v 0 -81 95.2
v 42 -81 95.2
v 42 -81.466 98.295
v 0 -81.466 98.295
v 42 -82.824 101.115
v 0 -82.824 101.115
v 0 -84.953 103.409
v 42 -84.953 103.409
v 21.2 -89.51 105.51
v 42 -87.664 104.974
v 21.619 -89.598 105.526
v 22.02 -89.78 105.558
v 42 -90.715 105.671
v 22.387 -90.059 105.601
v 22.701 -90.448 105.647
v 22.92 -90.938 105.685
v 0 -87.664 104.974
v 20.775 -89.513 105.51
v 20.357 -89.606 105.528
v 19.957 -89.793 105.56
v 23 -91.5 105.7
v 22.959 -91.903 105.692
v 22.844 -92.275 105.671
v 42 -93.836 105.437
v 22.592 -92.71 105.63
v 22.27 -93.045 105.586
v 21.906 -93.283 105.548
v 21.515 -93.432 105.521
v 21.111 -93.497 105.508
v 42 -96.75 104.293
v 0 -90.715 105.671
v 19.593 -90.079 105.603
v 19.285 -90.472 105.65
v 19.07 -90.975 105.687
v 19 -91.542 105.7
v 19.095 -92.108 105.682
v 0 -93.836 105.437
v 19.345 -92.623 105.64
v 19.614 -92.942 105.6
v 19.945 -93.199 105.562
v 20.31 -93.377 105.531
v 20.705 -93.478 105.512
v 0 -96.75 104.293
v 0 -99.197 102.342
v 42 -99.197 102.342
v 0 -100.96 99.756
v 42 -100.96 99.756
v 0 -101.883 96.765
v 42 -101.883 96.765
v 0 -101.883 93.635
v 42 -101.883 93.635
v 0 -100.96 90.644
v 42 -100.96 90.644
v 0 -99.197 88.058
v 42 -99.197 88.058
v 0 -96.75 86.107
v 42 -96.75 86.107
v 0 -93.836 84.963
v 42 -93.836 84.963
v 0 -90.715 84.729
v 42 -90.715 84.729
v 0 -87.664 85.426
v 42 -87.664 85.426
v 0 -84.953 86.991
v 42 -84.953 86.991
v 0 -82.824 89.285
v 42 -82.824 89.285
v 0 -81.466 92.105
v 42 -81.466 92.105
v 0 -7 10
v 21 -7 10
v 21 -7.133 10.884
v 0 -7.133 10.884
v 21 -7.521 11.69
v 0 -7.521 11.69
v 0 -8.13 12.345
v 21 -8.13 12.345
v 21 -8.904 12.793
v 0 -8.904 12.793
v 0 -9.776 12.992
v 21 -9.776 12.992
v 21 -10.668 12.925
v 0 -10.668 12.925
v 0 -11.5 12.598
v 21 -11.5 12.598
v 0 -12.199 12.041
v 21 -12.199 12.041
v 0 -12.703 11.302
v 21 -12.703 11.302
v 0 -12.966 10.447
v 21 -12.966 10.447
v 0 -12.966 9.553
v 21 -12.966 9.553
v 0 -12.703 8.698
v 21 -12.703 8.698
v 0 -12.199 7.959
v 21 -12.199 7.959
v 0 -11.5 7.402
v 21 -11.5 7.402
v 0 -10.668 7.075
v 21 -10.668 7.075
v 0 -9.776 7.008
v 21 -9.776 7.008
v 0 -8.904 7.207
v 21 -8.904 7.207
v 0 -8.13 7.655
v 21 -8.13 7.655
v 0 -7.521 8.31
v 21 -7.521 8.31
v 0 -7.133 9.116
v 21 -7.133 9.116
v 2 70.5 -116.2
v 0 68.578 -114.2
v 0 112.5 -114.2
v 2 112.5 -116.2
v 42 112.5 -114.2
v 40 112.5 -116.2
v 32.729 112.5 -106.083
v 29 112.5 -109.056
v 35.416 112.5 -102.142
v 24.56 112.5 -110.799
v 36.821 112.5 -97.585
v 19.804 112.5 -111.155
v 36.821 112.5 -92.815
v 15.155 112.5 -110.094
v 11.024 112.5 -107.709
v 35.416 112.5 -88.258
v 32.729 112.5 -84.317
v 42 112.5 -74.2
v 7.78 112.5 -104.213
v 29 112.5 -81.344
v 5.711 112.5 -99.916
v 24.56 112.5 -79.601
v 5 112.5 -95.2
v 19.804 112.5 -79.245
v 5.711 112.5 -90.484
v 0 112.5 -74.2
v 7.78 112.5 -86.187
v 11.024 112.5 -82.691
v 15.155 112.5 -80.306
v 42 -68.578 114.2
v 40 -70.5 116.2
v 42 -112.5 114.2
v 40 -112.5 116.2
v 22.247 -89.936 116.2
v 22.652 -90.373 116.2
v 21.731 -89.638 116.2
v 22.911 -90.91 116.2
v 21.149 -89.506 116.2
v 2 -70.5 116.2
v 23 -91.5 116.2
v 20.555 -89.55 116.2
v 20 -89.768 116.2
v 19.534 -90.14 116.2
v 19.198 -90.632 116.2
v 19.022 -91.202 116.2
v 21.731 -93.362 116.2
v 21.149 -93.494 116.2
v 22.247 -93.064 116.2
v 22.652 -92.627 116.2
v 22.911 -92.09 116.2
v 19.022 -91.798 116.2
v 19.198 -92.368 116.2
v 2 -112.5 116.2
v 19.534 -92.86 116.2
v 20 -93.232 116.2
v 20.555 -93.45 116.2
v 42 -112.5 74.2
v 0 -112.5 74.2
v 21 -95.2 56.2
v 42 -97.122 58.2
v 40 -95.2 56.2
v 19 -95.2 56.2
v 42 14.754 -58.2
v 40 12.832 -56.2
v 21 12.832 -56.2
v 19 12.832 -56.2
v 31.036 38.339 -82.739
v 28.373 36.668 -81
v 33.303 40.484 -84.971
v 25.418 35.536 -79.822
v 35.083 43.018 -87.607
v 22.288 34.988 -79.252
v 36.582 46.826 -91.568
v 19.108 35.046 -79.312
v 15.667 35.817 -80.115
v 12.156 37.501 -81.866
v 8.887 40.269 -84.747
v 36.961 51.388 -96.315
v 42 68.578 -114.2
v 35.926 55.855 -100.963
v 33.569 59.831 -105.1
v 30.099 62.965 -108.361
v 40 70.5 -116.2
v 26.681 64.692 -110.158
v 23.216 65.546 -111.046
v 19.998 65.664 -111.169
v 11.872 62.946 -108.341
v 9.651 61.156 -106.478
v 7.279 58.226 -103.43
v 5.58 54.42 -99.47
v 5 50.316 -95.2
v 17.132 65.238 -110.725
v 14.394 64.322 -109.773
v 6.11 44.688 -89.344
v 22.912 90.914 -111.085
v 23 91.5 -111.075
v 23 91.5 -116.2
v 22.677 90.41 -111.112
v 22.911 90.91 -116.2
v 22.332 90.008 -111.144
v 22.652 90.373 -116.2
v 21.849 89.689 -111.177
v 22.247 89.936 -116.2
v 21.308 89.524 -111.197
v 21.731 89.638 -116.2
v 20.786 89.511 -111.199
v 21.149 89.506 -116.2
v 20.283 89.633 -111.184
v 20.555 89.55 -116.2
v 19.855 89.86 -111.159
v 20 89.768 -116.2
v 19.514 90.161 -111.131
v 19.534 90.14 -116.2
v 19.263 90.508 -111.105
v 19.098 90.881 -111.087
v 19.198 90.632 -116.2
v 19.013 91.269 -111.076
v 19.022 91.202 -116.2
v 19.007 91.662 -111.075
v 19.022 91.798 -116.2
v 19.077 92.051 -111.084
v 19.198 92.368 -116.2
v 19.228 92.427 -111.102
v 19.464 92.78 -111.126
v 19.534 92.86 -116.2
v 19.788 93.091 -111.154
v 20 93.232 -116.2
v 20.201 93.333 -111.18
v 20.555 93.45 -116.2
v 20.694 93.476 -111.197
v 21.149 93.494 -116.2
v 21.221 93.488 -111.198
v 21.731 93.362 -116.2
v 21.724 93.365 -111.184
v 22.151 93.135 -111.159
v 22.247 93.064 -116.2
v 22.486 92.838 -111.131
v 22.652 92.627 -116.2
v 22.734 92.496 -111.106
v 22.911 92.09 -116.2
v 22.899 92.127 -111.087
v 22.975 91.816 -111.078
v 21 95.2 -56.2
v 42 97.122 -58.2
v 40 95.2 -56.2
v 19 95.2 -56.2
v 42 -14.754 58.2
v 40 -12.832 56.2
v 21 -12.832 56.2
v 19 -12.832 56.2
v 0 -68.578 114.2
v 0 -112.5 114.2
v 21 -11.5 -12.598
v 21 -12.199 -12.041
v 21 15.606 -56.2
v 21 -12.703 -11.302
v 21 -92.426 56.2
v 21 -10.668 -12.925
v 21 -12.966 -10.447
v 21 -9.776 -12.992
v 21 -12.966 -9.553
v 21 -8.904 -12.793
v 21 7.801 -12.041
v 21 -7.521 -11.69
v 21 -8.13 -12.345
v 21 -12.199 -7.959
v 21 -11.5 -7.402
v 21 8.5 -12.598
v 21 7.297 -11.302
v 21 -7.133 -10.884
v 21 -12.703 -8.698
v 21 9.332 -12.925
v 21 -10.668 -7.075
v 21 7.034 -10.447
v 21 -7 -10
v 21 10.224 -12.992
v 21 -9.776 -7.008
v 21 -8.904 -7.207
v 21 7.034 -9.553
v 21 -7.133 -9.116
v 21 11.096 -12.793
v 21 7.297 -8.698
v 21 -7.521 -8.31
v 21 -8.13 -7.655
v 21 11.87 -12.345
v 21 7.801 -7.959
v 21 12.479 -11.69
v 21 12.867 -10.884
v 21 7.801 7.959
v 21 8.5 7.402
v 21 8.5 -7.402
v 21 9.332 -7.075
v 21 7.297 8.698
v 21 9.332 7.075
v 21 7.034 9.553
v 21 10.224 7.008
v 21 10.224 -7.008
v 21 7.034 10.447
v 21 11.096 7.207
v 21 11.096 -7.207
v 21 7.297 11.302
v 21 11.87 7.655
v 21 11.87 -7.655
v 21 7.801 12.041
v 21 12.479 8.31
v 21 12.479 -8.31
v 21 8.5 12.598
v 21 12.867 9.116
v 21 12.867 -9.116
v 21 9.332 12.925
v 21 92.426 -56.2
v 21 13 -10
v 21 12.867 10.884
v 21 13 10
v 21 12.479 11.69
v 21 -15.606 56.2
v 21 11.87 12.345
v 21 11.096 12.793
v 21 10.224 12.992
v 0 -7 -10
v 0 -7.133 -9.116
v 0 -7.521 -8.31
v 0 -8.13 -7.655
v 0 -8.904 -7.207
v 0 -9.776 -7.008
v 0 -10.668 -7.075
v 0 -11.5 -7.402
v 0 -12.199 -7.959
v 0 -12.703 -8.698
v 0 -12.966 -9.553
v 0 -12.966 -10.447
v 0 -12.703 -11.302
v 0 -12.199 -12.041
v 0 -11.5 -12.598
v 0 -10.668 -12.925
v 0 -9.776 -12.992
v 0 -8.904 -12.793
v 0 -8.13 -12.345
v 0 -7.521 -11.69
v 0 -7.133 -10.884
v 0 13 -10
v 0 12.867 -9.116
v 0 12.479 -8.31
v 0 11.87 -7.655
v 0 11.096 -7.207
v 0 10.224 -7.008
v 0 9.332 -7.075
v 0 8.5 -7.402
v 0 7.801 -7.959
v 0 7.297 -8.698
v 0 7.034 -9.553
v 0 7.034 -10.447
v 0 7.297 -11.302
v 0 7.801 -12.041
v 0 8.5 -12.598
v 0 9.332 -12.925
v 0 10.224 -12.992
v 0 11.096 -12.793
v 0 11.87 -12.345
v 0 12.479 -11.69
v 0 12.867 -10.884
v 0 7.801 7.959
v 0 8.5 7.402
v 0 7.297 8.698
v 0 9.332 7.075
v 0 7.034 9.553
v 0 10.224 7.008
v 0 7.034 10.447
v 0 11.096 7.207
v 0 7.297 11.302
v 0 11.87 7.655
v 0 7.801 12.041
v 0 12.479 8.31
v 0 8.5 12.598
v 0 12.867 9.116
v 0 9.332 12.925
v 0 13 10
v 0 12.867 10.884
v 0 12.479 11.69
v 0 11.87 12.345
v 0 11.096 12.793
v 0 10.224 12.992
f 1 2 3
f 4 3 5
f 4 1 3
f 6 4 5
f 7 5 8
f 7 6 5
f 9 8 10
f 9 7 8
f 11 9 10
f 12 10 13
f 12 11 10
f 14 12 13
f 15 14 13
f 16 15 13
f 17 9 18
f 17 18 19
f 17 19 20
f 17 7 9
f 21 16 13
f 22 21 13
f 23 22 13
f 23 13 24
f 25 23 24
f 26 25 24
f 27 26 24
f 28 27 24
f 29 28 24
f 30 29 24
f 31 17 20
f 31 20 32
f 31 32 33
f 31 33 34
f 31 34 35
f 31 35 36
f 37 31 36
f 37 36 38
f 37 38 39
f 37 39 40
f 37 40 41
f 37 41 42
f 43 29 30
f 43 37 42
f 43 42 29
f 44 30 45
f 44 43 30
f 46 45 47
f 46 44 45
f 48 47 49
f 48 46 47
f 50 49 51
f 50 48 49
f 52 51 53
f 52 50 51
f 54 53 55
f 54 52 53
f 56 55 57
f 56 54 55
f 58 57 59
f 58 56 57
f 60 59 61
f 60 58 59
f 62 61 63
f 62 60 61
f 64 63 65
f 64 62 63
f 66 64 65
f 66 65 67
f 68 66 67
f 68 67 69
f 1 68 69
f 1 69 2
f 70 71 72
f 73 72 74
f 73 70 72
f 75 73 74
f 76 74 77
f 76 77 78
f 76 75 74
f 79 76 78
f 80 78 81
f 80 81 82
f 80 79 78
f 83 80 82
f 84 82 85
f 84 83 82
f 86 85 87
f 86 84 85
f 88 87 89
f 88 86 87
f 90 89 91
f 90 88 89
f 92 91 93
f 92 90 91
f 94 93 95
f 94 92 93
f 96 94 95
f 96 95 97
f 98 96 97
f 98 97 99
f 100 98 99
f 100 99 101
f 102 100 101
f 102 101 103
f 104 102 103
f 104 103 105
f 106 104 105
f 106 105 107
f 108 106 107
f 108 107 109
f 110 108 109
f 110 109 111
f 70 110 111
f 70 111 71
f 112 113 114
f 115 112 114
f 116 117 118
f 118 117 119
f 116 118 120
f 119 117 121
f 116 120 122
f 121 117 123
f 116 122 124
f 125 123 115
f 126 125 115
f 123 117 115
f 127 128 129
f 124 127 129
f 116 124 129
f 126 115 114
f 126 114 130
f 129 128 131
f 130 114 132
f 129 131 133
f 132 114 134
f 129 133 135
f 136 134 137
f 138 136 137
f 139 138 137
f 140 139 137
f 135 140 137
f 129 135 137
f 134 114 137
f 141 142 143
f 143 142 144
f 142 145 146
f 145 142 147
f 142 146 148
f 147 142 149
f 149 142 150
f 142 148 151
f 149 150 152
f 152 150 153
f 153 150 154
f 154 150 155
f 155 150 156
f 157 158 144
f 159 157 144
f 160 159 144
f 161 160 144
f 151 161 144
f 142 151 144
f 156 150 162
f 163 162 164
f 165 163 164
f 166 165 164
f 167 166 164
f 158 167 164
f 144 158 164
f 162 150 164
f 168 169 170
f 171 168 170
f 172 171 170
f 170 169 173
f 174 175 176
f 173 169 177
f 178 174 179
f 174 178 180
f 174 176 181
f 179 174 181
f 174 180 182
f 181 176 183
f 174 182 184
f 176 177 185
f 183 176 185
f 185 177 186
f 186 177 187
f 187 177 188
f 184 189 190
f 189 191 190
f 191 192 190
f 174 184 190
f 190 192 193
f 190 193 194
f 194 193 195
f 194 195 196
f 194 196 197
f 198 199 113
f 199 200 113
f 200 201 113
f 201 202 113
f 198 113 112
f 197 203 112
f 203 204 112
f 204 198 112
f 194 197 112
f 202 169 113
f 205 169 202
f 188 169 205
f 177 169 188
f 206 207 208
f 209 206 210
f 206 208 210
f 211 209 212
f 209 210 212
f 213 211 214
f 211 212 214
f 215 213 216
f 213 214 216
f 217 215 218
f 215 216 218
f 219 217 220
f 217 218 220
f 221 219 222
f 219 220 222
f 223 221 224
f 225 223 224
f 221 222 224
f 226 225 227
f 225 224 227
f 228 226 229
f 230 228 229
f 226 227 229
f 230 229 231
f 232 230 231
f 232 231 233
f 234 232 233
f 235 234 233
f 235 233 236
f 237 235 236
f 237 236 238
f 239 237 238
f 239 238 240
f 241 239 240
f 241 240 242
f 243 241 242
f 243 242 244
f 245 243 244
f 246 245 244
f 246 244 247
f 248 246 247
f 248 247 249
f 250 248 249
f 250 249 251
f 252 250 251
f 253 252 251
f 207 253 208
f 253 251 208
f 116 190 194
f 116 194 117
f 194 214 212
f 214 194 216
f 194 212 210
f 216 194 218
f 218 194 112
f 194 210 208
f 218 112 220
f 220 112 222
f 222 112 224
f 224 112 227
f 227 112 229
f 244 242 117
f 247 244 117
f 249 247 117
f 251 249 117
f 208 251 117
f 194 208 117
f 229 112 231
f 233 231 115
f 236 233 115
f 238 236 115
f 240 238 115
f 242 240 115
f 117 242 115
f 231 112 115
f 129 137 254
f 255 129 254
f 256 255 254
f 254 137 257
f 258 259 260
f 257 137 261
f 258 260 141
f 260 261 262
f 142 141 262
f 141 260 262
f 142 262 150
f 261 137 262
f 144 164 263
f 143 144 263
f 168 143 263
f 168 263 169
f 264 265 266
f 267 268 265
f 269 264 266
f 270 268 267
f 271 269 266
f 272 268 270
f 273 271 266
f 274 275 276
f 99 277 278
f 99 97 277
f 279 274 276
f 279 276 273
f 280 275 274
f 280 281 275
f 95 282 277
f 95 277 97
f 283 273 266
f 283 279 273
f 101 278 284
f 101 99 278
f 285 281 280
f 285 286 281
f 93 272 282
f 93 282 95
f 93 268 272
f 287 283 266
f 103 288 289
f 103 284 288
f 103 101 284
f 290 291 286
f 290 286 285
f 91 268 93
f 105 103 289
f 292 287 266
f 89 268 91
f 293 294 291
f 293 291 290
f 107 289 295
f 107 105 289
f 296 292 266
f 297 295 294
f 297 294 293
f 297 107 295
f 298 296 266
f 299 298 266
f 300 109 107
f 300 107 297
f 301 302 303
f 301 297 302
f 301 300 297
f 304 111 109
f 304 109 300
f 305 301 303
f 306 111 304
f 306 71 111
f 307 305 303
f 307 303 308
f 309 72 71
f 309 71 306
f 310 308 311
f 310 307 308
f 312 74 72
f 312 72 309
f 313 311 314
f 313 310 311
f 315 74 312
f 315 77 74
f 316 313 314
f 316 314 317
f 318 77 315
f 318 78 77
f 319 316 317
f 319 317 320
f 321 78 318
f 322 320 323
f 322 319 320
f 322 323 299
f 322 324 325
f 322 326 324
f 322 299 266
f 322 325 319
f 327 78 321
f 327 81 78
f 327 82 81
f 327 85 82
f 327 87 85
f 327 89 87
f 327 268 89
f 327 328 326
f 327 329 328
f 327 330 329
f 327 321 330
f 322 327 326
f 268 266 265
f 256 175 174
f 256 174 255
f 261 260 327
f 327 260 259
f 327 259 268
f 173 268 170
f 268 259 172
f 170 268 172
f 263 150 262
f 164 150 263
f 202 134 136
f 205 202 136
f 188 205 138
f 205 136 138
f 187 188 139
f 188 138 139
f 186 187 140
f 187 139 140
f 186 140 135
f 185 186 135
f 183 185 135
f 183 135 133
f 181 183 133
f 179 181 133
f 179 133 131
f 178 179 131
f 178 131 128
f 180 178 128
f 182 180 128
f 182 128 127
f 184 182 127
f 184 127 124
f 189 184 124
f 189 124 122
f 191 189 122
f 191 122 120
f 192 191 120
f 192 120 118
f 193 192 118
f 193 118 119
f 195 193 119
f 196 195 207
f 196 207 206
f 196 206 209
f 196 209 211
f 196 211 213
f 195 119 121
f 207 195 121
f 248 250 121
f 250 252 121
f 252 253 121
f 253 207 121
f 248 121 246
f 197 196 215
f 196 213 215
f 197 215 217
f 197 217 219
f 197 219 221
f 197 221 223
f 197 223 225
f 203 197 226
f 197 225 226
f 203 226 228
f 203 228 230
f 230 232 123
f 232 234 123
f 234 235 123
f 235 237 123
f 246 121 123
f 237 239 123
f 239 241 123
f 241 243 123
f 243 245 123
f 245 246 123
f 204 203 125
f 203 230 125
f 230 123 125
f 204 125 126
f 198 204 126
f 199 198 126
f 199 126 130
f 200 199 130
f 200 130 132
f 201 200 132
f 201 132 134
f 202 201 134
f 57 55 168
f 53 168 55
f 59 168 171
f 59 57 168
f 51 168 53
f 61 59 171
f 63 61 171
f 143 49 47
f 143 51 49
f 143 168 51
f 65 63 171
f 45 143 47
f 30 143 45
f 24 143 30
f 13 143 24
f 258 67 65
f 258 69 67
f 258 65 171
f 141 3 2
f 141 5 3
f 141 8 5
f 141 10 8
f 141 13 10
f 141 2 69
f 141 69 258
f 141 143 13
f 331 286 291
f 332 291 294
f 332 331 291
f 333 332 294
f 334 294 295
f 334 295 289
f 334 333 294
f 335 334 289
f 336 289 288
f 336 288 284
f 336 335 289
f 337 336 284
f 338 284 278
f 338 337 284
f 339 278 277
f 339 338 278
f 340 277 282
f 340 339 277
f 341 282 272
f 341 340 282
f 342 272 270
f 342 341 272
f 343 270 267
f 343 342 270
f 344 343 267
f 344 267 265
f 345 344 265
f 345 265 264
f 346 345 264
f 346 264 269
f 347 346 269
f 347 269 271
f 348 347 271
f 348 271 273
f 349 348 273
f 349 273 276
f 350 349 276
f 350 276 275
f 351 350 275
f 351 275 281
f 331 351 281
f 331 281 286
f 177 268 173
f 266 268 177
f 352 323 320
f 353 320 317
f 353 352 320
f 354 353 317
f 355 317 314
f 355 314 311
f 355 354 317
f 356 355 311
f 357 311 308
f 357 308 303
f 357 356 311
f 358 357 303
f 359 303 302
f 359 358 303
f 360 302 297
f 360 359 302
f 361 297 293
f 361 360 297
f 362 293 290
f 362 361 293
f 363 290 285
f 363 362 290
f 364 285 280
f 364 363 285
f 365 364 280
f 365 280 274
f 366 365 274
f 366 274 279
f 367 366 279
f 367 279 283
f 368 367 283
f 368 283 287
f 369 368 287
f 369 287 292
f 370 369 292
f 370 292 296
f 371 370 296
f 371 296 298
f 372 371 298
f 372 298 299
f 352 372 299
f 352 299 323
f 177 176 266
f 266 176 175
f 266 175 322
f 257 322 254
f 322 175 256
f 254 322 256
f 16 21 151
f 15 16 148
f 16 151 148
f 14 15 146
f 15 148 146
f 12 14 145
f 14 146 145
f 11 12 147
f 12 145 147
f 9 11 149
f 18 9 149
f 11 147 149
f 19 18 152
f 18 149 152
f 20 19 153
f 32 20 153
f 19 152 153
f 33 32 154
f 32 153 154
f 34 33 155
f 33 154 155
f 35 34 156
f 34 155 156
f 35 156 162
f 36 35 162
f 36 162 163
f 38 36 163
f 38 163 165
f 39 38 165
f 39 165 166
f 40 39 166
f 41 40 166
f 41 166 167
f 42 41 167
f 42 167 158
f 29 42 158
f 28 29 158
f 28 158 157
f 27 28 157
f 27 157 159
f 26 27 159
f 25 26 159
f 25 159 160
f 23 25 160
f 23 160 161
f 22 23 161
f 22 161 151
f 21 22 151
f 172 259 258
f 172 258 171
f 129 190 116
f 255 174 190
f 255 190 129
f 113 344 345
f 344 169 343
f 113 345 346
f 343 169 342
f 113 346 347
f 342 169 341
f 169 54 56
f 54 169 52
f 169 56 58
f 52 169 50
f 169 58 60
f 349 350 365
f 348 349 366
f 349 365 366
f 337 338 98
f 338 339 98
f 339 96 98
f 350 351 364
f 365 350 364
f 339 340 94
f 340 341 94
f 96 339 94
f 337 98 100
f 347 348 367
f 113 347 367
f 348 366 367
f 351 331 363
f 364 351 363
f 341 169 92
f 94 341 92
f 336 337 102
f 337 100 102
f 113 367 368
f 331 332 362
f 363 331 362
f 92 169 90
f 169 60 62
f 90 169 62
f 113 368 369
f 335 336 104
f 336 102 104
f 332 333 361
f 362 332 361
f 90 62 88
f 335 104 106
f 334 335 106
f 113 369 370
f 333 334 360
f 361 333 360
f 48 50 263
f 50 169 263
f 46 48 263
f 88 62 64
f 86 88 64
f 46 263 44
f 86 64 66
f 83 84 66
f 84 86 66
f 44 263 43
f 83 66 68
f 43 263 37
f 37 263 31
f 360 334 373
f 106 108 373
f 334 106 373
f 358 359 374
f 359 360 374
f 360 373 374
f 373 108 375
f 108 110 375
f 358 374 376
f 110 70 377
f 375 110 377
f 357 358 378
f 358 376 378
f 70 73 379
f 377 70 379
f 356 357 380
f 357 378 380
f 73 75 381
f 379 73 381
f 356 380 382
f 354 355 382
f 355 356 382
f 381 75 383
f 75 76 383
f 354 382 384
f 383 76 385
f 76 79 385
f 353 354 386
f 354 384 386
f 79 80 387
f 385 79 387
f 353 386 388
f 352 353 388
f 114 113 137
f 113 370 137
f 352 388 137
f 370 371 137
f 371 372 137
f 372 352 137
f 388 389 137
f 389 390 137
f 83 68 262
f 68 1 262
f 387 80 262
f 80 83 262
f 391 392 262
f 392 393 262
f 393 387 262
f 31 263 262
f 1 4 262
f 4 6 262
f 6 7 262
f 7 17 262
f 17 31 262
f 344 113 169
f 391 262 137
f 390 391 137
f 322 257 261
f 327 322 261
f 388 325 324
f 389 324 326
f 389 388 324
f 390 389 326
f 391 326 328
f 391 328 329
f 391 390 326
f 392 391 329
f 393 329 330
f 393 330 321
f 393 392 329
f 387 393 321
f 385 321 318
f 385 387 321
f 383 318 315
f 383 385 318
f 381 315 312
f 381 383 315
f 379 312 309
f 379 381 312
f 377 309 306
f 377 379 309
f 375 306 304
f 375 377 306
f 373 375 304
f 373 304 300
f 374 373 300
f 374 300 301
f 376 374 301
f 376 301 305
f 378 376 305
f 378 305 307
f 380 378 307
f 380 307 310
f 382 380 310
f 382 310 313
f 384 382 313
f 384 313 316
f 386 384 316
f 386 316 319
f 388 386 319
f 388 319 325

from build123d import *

# Parameters (mm, degrees)
F0_R      = 3
F0_R_2    = 10.5
F1_DEPTH  = 42
F2_R      = 3
F3_DEPTH  = 21
F4_R      = 16
F5_DEPTH  = 85
F6_SIZE   = 2
F7_R      = 2
F8_DEPTH  = 25
F9_R      = 2
F10_DEPTH = 25


with BuildPart() as f1:
    # F0 (on Right) → F1 (new body)
    with BuildSketch(Plane.YZ):
        Polygon((70.5, -116.2), (112.5, -116.2), (112.5, -74.2), (-70.5, 116.2), (-112.5, 116.2), (-112.5, 74.2), align=None)
        with Locations((-10, -10)):
            Circle(F0_R, mode=Mode.SUBTRACT)
        with Locations((10, -10)):
            Circle(F0_R, mode=Mode.SUBTRACT)
        with Locations((-10, 10)):
            Circle(F0_R, mode=Mode.SUBTRACT)
        with Locations((-91.5, 95.2)):
            Circle(F0_R_2, mode=Mode.SUBTRACT)
        with Locations((10, 10)):
            Circle(F0_R, mode=Mode.SUBTRACT)
    extrude(amount=F1_DEPTH)

    # F2 (on face) → F3 (cut)
    with BuildSketch(Plane.YZ.offset(42)):
        Polygon((12.831933, -56.2), (95.19958, -56.2), (-12.831933, 56.2), (-95.19958, 56.2), align=None)
        with Locations((-10, -10)):
            Circle(F2_R, mode=Mode.SUBTRACT)
        with Locations((10, -10)):
            Circle(F2_R, mode=Mode.SUBTRACT)
        with Locations((-10, 10)):
            Circle(F2_R, mode=Mode.SUBTRACT)
        with Locations((10, 10)):
            Circle(F2_R, mode=Mode.SUBTRACT)
    extrude(amount=-F3_DEPTH, mode=Mode.SUBTRACT)

    # F4 (on face) → F5 (cut)
    with BuildSketch(Plane(origin=(0, 112.5, 0), x_dir=(-1, 0, 0), z_dir=(0, 1, 0))):
        with Locations((-21, -95.2)):
            Circle(F4_R)
    extrude(amount=-F5_DEPTH, mode=Mode.SUBTRACT)

    # F6
    f6_edges = [f1.edges().sort_by_distance(p)[0] for p in [
        (21, 41.183824, 0),
        (21, -41.183824, 0),
        (42, -54.015756, 56.2),
        (0, -91.5, 116.2),
        (0, 91.5, -116.2),
        (42, 54.015756, -56.2),
        (42, 91.5, -116.2),
        (42, -91.5, 116.2),
    ]]
    chamfer(f6_edges, length=F6_SIZE)

    # F7 (on face) → F8 (cut)
    with BuildSketch(Plane.XY.offset(116.2)):
        with Locations((21, -91.5)):
            Circle(F7_R)
    extrude(amount=-F8_DEPTH, mode=Mode.SUBTRACT)

    # F9 (on face) → F10 (cut)
    with BuildSketch(Plane(origin=(0, 0, -116.2), x_dir=(1, 0, 0), z_dir=(0, 0, -1))):
        with Locations((21, -91.5)):
            Circle(F9_R)
    extrude(amount=-F10_DEPTH, mode=Mode.SUBTRACT)


solid = f1.part
